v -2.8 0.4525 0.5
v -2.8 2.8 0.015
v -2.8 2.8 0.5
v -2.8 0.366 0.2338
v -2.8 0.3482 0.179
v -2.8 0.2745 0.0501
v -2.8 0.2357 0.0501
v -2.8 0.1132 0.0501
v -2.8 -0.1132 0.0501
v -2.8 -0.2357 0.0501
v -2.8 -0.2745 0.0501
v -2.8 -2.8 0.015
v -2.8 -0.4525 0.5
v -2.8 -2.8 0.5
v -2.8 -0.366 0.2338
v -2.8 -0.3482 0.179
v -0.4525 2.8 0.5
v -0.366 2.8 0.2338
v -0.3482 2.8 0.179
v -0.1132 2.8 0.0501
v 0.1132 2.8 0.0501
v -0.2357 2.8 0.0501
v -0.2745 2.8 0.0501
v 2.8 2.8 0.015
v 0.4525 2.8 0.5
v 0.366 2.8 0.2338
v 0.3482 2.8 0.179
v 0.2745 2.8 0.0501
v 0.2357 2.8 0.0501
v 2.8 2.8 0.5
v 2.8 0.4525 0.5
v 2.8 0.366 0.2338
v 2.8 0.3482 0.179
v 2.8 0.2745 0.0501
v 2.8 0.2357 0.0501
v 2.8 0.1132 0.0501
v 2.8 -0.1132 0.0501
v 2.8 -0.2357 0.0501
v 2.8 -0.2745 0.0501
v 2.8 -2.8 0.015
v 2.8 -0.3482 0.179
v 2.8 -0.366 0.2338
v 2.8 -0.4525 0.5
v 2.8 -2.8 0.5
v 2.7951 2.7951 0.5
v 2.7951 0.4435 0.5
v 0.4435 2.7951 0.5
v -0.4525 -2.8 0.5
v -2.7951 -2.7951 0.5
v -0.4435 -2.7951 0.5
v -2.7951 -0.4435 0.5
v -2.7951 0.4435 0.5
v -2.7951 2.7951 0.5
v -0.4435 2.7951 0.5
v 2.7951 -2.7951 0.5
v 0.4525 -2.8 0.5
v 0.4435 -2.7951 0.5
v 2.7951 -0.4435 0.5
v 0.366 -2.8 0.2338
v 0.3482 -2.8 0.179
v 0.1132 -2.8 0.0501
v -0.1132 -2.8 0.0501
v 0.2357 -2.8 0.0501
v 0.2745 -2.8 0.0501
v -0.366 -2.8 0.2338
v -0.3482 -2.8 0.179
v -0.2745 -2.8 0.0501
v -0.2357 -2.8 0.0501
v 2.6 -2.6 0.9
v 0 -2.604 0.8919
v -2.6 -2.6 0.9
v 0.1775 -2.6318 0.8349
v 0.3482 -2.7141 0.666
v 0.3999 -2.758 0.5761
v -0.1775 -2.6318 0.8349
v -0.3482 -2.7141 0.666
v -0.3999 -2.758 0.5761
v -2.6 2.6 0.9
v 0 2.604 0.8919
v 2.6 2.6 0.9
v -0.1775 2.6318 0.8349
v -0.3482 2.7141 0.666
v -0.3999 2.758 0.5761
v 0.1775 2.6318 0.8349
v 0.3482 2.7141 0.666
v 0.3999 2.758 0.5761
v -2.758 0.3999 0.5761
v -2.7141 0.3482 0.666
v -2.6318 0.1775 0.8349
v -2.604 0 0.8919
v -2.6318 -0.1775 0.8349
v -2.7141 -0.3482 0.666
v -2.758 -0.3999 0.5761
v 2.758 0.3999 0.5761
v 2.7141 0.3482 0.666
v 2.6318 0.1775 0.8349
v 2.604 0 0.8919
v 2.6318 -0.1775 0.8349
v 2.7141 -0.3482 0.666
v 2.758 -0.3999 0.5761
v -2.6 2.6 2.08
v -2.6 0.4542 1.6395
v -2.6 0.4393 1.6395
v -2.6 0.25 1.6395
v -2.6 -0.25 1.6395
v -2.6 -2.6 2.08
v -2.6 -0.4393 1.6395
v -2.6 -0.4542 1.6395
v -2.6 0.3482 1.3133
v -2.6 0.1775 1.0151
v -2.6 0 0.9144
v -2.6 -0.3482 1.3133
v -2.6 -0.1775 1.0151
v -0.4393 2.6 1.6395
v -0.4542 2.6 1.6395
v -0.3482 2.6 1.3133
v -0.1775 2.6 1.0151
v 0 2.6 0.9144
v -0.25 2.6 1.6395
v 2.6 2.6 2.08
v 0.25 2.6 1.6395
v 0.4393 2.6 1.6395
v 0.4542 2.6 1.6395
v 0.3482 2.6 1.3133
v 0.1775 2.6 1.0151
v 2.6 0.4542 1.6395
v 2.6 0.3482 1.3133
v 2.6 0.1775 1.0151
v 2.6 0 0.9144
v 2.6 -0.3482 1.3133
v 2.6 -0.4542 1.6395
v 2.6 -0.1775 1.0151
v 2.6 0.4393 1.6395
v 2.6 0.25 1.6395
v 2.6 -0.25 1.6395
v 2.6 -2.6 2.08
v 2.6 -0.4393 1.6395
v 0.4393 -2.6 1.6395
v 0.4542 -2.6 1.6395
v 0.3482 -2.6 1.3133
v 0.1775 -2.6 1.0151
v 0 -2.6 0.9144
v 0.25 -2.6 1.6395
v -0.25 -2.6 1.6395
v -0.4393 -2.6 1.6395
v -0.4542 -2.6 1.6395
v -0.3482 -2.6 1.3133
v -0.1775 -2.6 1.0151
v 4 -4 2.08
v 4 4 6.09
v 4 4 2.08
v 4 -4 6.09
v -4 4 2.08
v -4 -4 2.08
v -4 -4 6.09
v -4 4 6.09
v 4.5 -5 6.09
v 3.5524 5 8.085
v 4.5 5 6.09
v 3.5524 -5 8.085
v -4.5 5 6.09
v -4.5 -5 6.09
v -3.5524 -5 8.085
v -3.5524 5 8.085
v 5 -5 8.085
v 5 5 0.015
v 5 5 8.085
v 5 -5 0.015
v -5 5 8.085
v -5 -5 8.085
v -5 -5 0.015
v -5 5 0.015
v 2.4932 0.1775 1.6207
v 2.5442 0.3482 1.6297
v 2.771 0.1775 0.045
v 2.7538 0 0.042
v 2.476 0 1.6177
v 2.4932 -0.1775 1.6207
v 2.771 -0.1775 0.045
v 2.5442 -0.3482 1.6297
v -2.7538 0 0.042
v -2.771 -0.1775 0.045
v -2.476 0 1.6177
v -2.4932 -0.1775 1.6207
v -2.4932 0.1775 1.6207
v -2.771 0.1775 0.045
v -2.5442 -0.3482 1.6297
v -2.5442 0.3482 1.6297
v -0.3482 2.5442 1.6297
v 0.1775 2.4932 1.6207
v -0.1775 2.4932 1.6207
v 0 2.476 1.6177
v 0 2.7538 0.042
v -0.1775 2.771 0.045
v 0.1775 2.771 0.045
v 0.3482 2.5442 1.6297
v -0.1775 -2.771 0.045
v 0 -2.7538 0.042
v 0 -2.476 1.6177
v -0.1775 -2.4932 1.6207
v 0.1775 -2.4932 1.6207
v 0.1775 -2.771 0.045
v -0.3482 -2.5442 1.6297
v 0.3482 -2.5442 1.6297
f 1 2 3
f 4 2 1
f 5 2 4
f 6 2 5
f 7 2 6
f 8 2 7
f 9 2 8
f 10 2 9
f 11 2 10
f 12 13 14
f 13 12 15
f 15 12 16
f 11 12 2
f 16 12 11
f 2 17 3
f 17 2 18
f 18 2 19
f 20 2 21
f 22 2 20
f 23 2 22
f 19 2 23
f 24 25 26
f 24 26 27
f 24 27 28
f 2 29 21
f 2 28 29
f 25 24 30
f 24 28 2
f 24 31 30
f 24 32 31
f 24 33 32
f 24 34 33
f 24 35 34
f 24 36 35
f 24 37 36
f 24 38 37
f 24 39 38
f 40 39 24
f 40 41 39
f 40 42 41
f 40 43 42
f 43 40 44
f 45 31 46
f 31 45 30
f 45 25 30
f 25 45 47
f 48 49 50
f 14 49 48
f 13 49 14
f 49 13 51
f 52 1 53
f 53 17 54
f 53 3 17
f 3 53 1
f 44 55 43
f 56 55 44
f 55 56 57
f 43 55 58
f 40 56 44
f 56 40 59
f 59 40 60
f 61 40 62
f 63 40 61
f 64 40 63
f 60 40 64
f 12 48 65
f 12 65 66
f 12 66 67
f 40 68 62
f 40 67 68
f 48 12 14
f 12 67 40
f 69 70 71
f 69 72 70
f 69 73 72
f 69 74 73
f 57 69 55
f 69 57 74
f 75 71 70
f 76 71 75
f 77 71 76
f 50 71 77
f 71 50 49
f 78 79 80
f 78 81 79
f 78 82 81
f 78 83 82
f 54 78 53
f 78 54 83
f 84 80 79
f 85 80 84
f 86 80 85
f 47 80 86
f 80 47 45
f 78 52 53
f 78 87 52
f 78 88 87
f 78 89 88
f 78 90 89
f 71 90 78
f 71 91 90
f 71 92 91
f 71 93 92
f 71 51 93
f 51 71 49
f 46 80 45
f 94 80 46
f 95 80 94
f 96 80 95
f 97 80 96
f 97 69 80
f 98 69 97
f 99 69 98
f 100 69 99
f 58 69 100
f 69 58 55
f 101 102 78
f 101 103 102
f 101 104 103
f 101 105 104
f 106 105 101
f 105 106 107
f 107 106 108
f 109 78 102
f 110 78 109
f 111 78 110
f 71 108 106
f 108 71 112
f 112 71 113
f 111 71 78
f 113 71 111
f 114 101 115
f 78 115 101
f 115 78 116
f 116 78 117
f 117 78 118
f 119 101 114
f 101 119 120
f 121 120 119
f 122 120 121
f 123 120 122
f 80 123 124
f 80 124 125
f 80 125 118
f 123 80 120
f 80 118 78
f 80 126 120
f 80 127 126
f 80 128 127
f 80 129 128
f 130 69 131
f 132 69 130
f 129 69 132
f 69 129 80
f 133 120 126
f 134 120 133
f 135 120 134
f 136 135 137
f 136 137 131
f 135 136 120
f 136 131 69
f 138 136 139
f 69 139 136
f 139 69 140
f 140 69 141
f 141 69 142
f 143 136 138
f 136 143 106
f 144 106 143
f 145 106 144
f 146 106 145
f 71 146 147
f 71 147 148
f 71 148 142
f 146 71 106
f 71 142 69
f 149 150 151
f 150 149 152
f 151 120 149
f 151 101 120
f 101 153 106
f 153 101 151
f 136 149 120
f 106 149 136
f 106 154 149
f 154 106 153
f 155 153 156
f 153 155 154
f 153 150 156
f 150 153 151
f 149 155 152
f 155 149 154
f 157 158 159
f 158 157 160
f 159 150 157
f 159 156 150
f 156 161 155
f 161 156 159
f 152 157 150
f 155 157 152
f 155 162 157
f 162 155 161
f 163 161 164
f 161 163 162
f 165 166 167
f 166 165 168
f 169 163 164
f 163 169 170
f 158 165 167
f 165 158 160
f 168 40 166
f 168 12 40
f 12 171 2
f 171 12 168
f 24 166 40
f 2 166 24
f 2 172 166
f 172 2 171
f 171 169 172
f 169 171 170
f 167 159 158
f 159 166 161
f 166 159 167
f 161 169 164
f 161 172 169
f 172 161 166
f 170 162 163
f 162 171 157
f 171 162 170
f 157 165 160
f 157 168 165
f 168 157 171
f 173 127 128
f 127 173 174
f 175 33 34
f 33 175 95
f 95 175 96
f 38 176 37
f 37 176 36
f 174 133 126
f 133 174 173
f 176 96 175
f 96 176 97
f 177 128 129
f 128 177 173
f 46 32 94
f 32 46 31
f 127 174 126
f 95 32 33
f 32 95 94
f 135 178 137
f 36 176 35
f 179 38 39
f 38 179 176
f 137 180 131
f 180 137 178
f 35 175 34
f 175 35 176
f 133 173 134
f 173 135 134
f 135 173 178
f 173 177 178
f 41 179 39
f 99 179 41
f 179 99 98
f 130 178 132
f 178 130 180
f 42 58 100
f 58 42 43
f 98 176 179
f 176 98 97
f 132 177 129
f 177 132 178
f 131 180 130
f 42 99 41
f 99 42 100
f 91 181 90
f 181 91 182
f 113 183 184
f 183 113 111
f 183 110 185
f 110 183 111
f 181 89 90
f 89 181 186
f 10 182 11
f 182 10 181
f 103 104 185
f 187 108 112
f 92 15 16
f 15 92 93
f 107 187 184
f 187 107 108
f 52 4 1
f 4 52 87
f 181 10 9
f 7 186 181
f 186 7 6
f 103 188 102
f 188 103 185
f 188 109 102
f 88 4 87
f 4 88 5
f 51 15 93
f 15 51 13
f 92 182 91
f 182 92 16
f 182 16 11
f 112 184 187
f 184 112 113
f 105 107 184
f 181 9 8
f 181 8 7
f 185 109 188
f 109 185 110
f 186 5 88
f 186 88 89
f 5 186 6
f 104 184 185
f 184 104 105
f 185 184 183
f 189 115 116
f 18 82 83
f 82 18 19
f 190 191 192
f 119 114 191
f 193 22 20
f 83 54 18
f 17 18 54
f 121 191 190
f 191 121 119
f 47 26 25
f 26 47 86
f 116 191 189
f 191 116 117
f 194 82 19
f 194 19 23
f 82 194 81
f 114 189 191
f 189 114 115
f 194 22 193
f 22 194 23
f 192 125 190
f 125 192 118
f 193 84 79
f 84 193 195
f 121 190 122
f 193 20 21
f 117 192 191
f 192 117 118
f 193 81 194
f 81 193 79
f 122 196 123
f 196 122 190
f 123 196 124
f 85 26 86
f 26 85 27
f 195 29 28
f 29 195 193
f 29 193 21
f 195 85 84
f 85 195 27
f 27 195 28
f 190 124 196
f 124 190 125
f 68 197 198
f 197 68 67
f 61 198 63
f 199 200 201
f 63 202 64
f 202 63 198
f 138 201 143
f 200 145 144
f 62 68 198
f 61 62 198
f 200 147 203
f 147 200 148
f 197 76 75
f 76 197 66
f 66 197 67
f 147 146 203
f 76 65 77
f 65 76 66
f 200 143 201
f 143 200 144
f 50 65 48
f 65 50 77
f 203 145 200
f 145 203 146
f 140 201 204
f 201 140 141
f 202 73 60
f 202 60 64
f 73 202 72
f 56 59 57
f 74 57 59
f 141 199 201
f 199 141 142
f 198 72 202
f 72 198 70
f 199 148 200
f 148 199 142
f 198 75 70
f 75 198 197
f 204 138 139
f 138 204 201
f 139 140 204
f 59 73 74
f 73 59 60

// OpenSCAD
w0 = 5.6;
h0 = 0.5;
w1 = 5.2;
h1 = 0.4;
w2 = 5.2;
h2 = 1.2;
w3 = 8;
h3 = 4;
w4 = 9;
h4 = 2;
w5 = 7.1;

module cutout() {
    union() {
        rotate([0,0,45])
        cylinder(h=h0+0.01,d1=w0*sqrt(2),d2=w0*sqrt(2), $fn=4);

        translate([0,0,h0])
        rotate([0,0,45])
        cylinder(h=h1+0.01,d1=w0*sqrt(2),d2=w1*sqrt(2), $fn=4);

        translate([0,0,h0+h1])
        rotate([0,0,45])
        cylinder(h=h2+0.01,d1=w2*sqrt(2),d2=w2*sqrt(2), $fn=4);

        translate([0,0,h0+h1+h2+h3/2])
        cube([w3,8,h3+0.02], center=true);

        pts = [[-w4/2,0],[-w5/2,h4],[w5/2,h4],[w4/2,0]];
        translate([0,0,h0+h1+h2+h3])
        translate([0,10,0])
        rotate([90,0,0])
        linear_extrude(height=20)
        polygon(pts);
    }
}

union() {
difference() {
    translate([0,0,(h0+h1+h2+h3+h4)/2])
    cube([10,10,h0+h1+h2+h3+h4-0.03], center=true);
    translate([0,0,-0.01])
    cutout();
}
/*
1.84 1.87 funktioniert nicht
1.80 war glaube ich zu locker
1.82 noch zu testen
*/
pfd=1.82;  
translate([7/2+0.15,0,0.2])
rotate([0,-10,0])
cylinder(d=pfd,h=1.6, $fn=32);

translate([-7/2-0.15,0,0.2])
rotate([0,10,0])
cylinder(d=pfd,h=1.6, $fn=32);

translate([0,7/2+0.15,0.2])
rotate([10,0,0])
cylinder(d=pfd,h=1.6, $fn=32);

translate([0,-7/2-0.15,0.2])
rotate([-10,0,0])
cylinder(d=pfd,h=1.6, $fn=32);
}
